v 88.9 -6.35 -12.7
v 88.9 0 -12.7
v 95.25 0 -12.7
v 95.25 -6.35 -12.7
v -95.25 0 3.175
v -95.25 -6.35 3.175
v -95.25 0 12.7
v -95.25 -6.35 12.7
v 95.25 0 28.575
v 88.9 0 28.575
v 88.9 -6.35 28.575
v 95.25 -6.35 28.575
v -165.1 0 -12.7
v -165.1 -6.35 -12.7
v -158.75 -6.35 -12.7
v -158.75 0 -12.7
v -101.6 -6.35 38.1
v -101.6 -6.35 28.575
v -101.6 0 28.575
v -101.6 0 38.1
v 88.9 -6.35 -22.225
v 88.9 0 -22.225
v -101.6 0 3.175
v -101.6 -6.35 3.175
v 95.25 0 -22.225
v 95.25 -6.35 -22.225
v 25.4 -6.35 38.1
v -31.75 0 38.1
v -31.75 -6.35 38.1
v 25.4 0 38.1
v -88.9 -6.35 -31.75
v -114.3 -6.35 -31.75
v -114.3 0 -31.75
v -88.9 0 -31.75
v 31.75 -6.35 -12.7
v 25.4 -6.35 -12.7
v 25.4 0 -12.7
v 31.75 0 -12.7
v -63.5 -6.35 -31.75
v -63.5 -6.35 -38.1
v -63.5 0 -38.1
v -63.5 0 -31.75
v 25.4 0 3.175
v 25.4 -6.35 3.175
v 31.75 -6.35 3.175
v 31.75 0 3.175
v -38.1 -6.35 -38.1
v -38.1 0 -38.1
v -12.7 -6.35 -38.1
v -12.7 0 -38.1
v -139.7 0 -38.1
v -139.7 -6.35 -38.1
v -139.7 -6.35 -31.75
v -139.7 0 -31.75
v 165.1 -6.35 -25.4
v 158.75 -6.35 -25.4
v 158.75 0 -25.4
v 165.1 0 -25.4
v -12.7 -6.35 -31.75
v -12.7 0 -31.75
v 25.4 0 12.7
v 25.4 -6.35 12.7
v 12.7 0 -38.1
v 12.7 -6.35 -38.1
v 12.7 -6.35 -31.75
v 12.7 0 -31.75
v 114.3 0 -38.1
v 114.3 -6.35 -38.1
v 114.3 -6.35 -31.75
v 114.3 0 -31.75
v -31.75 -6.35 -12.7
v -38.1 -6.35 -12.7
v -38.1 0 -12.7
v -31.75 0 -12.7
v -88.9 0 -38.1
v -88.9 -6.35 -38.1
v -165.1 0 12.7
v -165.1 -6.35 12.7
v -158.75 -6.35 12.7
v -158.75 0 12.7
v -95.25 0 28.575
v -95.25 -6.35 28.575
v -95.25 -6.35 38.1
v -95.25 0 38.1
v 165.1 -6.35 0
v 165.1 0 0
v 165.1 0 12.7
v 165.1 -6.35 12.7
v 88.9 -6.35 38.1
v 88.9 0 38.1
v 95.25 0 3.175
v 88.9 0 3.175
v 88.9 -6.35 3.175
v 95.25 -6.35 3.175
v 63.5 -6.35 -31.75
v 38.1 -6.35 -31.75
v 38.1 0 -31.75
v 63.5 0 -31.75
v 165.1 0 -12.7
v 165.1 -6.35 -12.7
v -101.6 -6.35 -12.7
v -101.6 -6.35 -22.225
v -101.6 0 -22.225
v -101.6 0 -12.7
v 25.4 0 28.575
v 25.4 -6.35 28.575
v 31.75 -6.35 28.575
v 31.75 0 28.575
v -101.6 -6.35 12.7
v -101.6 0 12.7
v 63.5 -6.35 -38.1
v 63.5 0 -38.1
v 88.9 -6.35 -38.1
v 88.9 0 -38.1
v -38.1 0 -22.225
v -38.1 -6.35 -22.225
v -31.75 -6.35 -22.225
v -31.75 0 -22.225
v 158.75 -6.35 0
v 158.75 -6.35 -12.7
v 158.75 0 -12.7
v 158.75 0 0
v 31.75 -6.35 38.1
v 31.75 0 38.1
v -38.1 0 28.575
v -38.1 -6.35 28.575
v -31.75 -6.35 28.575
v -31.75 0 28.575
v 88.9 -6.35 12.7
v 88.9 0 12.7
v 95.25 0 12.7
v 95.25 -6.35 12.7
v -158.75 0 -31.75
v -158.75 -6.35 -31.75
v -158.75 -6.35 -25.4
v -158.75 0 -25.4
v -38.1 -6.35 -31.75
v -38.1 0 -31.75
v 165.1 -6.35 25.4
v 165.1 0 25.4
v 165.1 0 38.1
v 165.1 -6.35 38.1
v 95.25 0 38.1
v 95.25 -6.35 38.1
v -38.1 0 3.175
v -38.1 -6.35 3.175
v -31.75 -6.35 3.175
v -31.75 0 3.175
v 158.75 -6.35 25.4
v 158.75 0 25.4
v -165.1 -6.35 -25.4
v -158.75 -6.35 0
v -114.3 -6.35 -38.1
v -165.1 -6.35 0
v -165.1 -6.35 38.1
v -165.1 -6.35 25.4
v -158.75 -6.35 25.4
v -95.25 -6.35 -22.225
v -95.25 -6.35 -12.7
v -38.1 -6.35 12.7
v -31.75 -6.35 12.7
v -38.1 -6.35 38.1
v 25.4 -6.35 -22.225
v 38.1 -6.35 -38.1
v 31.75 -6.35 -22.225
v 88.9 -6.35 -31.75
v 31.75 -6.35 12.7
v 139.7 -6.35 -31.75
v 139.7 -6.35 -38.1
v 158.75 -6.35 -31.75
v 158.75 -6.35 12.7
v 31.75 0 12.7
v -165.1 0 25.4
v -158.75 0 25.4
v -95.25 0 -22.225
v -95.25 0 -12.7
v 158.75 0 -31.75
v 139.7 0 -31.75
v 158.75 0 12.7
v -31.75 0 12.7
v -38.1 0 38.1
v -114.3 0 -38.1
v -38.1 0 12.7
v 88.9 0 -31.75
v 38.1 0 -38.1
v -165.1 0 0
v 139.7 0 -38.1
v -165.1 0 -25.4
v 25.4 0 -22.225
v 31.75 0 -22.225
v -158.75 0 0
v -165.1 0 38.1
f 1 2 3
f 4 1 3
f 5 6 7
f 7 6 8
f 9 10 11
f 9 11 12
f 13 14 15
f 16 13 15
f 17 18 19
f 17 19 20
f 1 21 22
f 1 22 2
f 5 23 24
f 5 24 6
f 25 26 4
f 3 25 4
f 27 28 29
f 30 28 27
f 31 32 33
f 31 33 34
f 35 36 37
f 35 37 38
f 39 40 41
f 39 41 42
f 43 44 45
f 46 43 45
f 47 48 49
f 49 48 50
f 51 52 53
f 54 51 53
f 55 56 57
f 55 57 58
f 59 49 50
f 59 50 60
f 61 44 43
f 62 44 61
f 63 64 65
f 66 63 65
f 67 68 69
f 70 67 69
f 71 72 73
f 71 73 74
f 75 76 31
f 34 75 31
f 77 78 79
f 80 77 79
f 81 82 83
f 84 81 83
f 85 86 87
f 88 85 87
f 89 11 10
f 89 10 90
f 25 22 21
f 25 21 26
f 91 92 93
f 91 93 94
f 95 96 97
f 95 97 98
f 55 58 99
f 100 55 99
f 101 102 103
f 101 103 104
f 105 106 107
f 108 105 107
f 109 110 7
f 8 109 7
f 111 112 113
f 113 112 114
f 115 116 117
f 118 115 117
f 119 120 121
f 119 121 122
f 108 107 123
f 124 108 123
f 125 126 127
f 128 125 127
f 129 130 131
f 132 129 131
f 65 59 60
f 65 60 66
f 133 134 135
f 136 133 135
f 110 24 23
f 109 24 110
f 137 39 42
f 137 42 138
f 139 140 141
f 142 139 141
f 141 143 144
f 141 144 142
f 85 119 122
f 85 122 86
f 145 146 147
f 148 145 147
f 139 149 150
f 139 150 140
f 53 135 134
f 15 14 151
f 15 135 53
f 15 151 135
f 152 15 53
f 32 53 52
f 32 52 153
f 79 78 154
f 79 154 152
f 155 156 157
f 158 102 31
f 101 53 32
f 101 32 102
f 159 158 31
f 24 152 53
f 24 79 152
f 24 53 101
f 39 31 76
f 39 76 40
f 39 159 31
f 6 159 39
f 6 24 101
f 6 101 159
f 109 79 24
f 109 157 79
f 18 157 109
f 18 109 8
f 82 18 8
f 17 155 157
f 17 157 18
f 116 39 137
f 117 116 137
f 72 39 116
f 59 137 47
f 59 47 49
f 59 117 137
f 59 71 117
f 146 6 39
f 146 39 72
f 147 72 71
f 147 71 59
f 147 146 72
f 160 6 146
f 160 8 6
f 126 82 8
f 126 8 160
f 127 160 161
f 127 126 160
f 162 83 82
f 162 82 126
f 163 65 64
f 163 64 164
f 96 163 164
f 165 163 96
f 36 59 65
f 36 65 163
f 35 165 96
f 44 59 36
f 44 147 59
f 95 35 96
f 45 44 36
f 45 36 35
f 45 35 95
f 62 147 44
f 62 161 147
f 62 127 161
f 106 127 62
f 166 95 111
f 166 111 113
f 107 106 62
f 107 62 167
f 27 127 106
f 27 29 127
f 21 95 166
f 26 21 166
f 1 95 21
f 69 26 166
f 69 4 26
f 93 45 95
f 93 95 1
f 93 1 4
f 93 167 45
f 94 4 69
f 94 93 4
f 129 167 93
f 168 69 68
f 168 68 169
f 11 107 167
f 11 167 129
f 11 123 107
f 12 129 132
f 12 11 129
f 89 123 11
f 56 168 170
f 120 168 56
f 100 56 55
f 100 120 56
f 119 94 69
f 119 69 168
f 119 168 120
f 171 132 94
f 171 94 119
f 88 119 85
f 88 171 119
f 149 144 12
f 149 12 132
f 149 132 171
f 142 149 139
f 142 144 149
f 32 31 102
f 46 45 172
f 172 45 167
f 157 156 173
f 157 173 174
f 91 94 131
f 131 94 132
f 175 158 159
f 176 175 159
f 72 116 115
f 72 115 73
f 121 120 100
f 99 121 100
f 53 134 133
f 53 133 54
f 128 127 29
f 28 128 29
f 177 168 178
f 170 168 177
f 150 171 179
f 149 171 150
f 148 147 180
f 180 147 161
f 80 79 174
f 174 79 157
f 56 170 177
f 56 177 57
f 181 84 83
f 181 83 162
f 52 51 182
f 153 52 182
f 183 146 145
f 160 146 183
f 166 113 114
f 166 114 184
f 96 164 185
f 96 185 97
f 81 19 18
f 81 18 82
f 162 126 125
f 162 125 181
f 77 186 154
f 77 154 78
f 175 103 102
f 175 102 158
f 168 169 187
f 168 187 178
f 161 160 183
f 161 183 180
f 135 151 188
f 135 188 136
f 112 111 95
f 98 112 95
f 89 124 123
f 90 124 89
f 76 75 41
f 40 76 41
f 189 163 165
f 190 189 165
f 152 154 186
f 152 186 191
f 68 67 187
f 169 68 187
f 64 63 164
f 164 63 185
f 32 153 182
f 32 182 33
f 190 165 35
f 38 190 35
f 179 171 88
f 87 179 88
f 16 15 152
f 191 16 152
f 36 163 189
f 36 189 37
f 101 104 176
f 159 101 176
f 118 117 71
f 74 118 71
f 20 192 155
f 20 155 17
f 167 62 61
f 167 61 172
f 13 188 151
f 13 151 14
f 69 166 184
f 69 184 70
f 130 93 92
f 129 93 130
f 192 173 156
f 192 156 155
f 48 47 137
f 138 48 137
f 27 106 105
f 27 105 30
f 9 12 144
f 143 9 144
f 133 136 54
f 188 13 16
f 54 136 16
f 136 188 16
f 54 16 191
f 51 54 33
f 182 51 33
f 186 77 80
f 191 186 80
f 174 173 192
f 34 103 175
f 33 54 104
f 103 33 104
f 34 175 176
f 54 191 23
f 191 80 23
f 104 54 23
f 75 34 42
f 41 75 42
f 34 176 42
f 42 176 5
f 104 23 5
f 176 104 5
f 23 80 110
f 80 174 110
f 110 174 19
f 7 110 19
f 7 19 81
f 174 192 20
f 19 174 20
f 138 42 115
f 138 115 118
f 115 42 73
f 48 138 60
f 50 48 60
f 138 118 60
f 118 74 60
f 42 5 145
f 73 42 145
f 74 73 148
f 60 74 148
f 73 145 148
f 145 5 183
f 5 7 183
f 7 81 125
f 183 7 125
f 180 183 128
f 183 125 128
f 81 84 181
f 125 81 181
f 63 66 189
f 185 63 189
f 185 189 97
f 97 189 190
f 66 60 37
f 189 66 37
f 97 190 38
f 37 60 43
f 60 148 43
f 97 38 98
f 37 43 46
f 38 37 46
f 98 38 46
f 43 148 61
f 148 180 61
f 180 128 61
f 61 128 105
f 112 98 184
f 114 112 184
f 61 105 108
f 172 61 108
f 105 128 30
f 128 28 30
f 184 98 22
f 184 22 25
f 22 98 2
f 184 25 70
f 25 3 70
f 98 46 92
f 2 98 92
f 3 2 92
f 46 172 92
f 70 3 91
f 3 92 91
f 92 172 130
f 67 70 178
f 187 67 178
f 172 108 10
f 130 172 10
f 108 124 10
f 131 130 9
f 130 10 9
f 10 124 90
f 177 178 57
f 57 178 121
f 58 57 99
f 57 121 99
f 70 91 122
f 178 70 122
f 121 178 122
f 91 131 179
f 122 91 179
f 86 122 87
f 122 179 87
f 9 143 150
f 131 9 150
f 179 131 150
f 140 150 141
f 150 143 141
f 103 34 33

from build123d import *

# Parameters (mm, degrees)
F0_W     = 330.2
F0_H     = 76.2
F1_DEPTH = 6.35
F2_W     = 25.4
F2_H     = 6.35
F2_W_2   = 6.35
F2_H_2   = 12.7
F3_DEPTH = 6.35
F4_W     = 6.35
F4_H     = 9.525
F5_DEPTH = 6.35
F6_W     = 6.35
F6_H     = 6.35
F7_DEPTH = 6.35


# Not quite as in the source:
# - a feature names something its author has since deleted; it is built from what else it names


with BuildPart() as f1:
    # F0 (on Front) → F1 (new body)
    with BuildSketch(Plane.XZ):
        Rectangle(F0_W, F0_H)
    extrude(amount=F1_DEPTH)

    # F2 (on face) → F3 (cut, through all)
    with BuildSketch(Plane.XZ.offset(6.35)):
        with Locations((-152.4, -34.925)):
            Rectangle(F2_W, F2_H)
        with Locations((-101.6, -34.925)):
            Rectangle(F2_W, F2_H)
        with Locations((-50.8, -34.925)):
            Rectangle(F2_W, F2_H)
        with Locations((0, -34.925)):
            Rectangle(F2_W, F2_H)
        with Locations((50.8, -34.925)):
            Rectangle(F2_W, F2_H)
        with Locations((101.6, -34.925)):
            Rectangle(F2_W, F2_H)
        with Locations((152.4, -34.925)):
            Rectangle(F2_W, F2_H)
        with Locations((-161.925, -6.35)):
            Rectangle(F2_W_2, F2_H_2)
        with Locations((-161.925, 19.05)):
            Rectangle(F2_W_2, F2_H_2)
        with Locations((161.925, 19.05)):
            Rectangle(F2_W_2, F2_H_2)
        with Locations((161.925, -6.35)):
            Rectangle(F2_W_2, F2_H_2)
    extrude(amount=-F3_DEPTH, mode=Mode.SUBTRACT)

    # F4 (on face) → F5 (cut, through all)
    with BuildSketch(Plane.XZ.offset(6.35)):
        with Locations((-98.425, 33.3375)):
            Rectangle(F4_W, F4_H)
        with Locations((-98.425, 7.9375)):
            Rectangle(F4_W, F4_H)
        with Locations((-98.425, -17.4625)):
            Rectangle(F4_W, F4_H)
        with Locations((-34.925, 7.9375)):
            Rectangle(F4_W, F4_H)
        with Locations((-34.925, 33.3375)):
            Rectangle(F4_W, F4_H)
        with Locations((-34.925, -17.4625)):
            Rectangle(F4_W, F4_H)
        with Locations((28.575, 7.9375)):
            Rectangle(F4_W, F4_H)
        with Locations((28.575, 33.3375)):
            Rectangle(F4_W, F4_H)
        with Locations((28.575, -17.4625)):
            Rectangle(F4_W, F4_H)
        with Locations((92.075, -17.4625)):
            Rectangle(F4_W, F4_H)
        with Locations((92.075, 7.9375)):
            Rectangle(F4_W, F4_H)
        with Locations((92.075, 33.3375)):
            Rectangle(F4_W, F4_H)
    extrude(amount=-F5_DEPTH, mode=Mode.SUBTRACT)

    # F6 (on face) → F7 (cut, through all)
    with BuildSketch(Plane.XZ.offset(6.35)):
        with Locations((-161.925, -28.575)):
            Rectangle(F6_W, F6_H)
        with Locations((161.925, -28.575)):
            Rectangle(F6_W, F6_H)
    extrude(amount=-F7_DEPTH, mode=Mode.SUBTRACT)


solid = f1.part
